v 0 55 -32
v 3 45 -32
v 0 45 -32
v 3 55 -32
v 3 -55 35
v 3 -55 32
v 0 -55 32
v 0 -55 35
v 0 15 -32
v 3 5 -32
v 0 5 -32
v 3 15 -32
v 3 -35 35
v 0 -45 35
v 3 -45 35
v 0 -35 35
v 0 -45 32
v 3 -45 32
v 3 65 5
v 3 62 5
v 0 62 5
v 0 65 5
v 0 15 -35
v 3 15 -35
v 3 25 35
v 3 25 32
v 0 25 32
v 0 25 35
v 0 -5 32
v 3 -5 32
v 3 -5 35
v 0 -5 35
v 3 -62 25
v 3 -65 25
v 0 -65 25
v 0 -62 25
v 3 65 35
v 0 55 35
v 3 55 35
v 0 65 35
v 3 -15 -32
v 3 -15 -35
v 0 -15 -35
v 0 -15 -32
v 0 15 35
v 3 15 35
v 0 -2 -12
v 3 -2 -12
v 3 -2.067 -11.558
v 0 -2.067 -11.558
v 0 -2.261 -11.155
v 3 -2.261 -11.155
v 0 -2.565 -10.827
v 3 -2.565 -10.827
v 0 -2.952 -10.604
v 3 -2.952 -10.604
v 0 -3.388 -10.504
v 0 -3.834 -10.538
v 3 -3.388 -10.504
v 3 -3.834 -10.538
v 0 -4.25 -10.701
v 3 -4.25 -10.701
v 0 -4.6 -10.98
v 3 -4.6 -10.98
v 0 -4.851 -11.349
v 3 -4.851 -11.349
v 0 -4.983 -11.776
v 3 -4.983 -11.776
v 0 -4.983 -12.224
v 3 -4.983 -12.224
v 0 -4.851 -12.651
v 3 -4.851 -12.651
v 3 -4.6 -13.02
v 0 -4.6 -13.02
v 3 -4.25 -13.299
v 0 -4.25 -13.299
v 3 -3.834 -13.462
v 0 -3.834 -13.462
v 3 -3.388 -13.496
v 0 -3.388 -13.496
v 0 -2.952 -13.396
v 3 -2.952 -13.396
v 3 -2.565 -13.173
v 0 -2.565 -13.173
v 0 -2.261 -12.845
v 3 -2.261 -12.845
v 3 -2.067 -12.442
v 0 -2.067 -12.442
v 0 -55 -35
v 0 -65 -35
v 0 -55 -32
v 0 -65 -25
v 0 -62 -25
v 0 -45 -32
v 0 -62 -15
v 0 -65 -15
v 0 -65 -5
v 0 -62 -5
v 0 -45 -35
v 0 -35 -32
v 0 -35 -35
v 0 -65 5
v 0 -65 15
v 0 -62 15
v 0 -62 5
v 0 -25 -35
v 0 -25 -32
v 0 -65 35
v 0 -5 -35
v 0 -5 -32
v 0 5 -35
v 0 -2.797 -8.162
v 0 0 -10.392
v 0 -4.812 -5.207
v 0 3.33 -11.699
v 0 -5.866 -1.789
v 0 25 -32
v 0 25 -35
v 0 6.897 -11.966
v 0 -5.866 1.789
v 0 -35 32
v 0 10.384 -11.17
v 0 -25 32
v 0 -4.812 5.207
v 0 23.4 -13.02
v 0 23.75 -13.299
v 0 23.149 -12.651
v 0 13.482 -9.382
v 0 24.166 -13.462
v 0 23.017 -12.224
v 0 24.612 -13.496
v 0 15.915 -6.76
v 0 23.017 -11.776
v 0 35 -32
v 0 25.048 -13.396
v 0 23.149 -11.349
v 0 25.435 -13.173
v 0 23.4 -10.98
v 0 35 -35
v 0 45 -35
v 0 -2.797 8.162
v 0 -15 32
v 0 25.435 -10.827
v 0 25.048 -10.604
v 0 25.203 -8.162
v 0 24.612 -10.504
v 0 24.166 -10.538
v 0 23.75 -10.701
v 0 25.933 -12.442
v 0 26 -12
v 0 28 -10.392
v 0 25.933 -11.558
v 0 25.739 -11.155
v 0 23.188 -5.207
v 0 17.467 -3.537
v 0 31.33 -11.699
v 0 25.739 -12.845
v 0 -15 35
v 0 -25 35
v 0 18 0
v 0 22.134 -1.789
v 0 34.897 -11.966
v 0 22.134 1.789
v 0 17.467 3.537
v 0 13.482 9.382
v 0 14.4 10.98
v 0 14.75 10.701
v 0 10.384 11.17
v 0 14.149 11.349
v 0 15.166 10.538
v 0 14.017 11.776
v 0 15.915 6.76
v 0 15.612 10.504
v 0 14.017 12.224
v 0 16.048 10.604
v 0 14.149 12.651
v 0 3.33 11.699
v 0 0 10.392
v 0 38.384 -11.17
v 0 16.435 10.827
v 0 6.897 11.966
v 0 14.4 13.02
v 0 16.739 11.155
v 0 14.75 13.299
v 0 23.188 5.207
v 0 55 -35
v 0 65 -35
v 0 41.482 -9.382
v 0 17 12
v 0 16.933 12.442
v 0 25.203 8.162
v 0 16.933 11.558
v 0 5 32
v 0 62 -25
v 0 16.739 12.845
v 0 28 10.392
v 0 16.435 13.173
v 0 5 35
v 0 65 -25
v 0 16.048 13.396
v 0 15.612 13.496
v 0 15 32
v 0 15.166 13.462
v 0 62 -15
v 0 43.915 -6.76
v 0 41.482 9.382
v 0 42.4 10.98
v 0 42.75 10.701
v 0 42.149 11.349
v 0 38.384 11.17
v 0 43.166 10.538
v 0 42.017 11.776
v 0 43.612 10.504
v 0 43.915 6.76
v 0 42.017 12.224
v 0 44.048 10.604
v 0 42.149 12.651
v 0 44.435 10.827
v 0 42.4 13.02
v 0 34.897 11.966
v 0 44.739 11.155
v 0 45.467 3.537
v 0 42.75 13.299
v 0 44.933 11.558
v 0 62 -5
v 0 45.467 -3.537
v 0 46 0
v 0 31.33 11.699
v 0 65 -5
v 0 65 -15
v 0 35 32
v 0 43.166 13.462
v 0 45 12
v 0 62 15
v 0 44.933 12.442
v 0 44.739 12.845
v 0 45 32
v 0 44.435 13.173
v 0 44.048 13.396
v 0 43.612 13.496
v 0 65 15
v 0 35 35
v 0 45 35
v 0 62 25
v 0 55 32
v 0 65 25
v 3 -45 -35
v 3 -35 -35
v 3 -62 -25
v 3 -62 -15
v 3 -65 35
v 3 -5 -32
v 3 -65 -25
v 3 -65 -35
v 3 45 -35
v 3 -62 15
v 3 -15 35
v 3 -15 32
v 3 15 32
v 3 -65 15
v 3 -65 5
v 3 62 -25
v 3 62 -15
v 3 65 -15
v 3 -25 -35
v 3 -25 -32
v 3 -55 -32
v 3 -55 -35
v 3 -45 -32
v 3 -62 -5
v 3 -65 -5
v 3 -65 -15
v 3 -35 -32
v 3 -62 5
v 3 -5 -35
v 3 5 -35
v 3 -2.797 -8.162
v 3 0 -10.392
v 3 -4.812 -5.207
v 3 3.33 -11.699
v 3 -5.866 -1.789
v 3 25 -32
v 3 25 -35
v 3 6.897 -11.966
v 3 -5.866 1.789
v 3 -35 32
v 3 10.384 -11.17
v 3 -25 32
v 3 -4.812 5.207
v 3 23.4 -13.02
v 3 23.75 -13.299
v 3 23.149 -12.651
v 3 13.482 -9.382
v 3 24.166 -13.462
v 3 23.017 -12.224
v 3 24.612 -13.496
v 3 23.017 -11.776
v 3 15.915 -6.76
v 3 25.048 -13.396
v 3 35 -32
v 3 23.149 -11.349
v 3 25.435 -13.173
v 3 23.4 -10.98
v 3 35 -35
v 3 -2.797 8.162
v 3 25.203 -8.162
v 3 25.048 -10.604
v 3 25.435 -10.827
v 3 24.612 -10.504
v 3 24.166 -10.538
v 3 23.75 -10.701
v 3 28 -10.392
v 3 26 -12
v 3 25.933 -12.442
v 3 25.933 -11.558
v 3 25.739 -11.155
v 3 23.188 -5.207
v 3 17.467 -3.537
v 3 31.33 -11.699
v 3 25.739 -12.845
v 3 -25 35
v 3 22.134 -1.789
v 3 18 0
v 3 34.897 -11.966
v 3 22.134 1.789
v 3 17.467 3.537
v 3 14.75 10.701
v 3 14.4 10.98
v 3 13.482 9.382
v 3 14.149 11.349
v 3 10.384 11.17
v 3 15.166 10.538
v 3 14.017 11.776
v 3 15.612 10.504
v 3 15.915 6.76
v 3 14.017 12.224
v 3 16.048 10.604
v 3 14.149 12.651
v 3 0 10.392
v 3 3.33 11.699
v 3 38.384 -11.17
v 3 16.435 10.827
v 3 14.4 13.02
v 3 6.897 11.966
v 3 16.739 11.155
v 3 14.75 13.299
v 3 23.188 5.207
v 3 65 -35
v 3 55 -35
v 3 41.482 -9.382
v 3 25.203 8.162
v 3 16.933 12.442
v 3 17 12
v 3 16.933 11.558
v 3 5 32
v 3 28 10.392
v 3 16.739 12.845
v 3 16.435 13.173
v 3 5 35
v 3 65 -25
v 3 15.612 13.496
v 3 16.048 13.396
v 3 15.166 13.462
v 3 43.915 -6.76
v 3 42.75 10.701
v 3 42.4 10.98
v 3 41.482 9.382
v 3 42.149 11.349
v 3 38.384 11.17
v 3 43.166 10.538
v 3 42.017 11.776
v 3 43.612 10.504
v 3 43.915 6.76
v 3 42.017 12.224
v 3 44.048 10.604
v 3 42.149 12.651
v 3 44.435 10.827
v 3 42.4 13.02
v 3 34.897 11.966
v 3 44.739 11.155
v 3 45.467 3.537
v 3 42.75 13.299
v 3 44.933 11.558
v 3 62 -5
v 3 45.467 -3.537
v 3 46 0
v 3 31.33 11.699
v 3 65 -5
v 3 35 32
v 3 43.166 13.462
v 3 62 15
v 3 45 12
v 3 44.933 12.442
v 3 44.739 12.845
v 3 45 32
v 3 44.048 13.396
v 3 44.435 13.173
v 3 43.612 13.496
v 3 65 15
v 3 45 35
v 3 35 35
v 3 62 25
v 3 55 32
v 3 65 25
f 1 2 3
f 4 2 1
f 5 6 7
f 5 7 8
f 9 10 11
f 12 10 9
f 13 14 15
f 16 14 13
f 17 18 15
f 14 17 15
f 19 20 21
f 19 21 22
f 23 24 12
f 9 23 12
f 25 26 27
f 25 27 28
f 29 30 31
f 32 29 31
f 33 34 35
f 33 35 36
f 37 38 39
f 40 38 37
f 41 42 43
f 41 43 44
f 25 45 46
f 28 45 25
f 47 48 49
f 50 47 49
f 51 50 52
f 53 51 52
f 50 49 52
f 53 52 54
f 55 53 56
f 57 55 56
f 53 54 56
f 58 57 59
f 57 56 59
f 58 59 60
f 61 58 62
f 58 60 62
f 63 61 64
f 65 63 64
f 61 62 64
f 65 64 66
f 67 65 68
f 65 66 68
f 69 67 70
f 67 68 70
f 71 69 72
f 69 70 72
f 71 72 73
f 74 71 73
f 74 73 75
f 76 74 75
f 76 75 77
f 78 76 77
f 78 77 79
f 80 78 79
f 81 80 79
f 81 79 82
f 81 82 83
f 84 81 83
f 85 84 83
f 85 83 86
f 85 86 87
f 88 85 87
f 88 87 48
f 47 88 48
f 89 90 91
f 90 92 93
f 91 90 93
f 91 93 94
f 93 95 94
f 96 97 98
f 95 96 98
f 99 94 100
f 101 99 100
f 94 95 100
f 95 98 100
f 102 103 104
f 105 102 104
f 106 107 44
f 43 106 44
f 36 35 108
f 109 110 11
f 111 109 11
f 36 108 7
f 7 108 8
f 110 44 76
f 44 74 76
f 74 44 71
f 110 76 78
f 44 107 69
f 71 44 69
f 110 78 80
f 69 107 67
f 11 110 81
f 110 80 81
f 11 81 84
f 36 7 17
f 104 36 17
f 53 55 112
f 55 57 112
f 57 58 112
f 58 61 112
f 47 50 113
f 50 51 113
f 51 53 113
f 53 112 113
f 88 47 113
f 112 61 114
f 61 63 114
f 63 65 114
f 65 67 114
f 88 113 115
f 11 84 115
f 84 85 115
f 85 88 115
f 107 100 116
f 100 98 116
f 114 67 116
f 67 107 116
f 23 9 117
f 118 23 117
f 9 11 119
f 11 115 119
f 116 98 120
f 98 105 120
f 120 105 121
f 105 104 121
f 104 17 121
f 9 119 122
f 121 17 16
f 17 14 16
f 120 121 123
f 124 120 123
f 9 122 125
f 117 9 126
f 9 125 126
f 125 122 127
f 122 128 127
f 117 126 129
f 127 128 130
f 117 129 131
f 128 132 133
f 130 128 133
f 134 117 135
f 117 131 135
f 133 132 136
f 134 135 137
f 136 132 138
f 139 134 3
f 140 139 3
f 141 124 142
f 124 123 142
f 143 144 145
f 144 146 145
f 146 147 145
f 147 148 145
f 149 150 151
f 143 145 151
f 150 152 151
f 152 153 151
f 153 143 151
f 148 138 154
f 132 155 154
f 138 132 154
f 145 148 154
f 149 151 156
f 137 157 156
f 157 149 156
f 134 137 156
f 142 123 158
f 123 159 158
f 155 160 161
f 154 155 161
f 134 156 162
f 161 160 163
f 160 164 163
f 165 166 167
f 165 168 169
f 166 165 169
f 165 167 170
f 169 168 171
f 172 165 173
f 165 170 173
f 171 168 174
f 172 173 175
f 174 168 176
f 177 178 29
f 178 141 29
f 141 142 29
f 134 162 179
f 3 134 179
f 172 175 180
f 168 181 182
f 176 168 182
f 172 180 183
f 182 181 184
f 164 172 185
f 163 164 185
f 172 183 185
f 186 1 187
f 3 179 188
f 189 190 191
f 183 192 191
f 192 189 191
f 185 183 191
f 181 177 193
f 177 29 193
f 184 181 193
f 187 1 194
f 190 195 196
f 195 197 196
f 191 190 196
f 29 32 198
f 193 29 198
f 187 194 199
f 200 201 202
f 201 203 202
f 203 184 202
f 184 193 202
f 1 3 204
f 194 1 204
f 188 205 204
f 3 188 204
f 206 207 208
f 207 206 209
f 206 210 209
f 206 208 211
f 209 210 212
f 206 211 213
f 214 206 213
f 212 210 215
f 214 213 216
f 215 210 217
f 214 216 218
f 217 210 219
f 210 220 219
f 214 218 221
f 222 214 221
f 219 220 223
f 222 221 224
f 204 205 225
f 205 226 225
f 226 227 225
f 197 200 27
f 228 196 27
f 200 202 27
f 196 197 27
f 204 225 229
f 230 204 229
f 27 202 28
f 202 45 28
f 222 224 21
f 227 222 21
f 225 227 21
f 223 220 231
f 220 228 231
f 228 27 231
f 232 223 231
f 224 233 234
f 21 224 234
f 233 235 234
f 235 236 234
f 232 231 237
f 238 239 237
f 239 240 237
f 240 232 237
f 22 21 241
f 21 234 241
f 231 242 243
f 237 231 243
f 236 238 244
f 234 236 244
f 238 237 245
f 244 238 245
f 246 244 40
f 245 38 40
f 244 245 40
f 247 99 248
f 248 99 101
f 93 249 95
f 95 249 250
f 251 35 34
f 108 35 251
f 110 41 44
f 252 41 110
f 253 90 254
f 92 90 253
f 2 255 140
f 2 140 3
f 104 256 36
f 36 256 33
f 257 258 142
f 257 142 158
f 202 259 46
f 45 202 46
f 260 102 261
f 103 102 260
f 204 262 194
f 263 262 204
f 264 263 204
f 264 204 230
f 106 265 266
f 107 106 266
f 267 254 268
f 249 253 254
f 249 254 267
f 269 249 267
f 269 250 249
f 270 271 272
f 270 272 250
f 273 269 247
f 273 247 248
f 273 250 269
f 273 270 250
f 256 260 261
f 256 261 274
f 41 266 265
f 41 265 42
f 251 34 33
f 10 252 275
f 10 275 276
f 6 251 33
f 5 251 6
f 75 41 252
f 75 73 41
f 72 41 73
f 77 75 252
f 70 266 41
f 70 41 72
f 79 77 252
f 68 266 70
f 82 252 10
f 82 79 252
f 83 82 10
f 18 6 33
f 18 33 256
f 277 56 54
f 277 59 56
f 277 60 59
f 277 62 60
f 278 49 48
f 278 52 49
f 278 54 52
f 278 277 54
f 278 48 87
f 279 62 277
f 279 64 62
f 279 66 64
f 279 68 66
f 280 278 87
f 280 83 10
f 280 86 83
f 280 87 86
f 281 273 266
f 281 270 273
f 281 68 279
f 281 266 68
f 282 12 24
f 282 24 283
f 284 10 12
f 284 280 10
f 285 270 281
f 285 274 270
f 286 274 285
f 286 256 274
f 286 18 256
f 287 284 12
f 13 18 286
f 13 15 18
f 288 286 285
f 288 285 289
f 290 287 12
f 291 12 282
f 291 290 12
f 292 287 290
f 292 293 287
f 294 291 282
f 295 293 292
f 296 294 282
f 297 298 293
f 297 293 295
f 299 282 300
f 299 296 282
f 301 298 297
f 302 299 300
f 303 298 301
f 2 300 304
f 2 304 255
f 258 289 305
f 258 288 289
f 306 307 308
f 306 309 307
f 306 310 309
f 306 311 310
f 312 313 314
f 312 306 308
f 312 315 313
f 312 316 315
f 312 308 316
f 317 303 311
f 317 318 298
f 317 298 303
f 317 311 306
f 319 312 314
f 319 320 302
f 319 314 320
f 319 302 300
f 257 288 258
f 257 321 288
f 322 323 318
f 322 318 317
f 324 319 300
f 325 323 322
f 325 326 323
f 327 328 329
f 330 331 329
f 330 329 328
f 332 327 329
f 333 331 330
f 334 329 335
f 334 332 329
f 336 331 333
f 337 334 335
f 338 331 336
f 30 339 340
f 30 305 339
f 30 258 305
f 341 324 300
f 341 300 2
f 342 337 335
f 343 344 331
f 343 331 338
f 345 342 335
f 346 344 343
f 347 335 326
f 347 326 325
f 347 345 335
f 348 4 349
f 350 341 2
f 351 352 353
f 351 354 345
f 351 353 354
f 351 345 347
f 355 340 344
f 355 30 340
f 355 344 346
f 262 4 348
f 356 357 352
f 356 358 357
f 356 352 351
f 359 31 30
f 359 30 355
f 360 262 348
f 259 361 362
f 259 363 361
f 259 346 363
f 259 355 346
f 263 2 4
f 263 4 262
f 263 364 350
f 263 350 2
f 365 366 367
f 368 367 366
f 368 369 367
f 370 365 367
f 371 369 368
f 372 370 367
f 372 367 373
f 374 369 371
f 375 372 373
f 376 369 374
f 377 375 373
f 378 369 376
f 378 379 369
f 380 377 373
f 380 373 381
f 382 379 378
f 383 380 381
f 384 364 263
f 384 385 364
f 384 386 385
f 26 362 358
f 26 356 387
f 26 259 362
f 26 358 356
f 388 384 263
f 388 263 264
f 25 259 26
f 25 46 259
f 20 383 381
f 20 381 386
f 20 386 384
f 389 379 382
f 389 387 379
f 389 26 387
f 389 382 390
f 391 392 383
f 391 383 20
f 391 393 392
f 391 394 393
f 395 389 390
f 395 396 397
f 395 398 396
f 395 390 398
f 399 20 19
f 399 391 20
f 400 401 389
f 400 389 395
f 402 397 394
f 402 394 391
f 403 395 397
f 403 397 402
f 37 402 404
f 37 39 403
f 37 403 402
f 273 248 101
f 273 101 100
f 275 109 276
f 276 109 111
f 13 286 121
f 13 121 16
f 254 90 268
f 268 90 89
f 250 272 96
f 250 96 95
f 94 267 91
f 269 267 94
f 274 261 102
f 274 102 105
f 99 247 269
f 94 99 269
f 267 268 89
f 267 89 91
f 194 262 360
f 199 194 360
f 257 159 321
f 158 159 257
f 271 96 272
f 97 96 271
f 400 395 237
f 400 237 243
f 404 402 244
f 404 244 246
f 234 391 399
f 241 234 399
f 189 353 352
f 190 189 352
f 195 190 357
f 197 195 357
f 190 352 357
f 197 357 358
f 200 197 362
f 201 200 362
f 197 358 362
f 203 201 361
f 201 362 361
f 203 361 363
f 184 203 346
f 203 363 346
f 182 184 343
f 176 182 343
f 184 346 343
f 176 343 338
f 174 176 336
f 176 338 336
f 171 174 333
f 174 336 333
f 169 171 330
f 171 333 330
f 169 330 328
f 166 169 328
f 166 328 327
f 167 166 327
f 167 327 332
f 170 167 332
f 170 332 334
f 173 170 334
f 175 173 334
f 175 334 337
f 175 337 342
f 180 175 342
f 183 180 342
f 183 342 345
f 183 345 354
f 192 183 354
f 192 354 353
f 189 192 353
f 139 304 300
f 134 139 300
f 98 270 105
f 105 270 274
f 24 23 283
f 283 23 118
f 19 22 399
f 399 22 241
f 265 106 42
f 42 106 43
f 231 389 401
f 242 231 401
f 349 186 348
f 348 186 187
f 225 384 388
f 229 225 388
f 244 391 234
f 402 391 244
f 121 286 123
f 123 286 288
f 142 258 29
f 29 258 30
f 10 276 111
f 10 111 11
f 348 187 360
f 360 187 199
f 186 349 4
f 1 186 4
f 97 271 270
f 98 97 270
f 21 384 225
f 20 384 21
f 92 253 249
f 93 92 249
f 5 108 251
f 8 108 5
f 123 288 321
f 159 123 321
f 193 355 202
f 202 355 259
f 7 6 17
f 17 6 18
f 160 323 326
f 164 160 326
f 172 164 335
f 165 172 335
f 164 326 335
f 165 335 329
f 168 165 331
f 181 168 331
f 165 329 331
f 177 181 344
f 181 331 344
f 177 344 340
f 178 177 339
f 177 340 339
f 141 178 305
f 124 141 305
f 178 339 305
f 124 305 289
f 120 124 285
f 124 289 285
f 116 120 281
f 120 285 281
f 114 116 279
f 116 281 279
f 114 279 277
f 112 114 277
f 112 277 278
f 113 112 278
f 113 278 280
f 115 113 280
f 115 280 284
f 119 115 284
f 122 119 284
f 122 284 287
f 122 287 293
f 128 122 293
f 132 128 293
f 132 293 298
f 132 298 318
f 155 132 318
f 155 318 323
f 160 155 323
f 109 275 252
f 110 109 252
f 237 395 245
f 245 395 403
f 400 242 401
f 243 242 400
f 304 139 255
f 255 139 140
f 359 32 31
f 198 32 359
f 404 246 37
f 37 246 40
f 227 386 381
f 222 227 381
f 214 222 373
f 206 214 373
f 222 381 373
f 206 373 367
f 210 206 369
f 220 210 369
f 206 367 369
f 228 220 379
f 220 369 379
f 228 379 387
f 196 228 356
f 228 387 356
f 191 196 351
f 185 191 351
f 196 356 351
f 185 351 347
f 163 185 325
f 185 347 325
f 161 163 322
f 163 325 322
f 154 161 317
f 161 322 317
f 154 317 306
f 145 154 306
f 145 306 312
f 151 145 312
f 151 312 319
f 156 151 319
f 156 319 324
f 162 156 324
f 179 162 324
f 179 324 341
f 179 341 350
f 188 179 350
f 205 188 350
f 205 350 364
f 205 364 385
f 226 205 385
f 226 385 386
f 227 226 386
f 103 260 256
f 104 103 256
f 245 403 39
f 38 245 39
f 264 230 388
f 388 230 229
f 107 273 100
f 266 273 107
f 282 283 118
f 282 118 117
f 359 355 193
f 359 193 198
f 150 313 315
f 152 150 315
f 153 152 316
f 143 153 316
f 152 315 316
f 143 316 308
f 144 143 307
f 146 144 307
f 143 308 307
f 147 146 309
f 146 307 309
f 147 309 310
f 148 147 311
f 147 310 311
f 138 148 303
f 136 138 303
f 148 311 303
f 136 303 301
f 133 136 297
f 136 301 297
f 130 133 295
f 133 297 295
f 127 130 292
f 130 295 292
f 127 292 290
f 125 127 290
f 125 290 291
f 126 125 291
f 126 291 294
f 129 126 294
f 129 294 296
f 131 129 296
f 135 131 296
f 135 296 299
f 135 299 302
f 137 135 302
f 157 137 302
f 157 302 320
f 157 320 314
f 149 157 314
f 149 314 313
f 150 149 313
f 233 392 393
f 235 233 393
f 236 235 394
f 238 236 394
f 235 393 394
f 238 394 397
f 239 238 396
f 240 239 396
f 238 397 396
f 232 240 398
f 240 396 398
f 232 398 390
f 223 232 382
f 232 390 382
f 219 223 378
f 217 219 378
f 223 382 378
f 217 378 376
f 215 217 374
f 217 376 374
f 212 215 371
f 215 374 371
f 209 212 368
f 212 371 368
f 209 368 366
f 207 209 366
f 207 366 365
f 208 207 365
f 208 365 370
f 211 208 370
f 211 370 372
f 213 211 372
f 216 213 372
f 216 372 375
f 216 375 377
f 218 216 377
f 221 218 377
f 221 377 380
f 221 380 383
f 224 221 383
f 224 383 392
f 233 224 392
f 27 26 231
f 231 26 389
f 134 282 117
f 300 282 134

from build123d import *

# Parameters (mm, degrees)
F0_W     = 130
F0_H     = 70
F1_DEPTH = 3
F2_W     = 3
F2_H     = 10
F2_W_2   = 10
F2_H_2   = 3
F3_DEPTH = 3.001
F4_R     = 12
F4_R_2   = 1.5
F5_DEPTH = 3.001


with BuildPart() as f1:
    # F0 (on Right) → F1 (new body)
    with BuildSketch(Plane.YZ):
        Rectangle(F0_W, F0_H)
    extrude(amount=F1_DEPTH)

    # F2 (on face) → F3 (cut, through all)
    with BuildSketch(Plane.YZ.offset(3)):
        with Locations((-63.5, 20)):
            Rectangle(F2_W, F2_H)
        with Locations((-63.5, 0)):
            Rectangle(F2_W, F2_H)
        with Locations((-63.5, -20)):
            Rectangle(F2_W, F2_H)
        with Locations((63.5, 0)):
            Rectangle(F2_W, F2_H)
        with Locations((63.5, 20)):
            Rectangle(F2_W, F2_H)
        with Locations((63.5, -20)):
            Rectangle(F2_W, F2_H)
        with Locations((-50, -33.5)):
            Rectangle(F2_W_2, F2_H_2)
        with Locations((-30, -33.5)):
            Rectangle(F2_W_2, F2_H_2)
        with Locations((-10, -33.5)):
            Rectangle(F2_W_2, F2_H_2)
        with Locations((10, -33.5)):
            Rectangle(F2_W_2, F2_H_2)
        with Locations((30, -33.5)):
            Rectangle(F2_W_2, F2_H_2)
        with Locations((50, -33.5)):
            Rectangle(F2_W_2, F2_H_2)
        with Locations((-50, 33.5)):
            Rectangle(F2_W_2, F2_H_2)
        with Locations((-30, 33.5)):
            Rectangle(F2_W_2, F2_H_2)
        with Locations((50, 33.5)):
            Rectangle(F2_W_2, F2_H_2)
        with Locations((-10, 33.5)):
            Rectangle(F2_W_2, F2_H_2)
        with Locations((10, 33.5)):
            Rectangle(F2_W_2, F2_H_2)
        with Locations((30, 33.5)):
            Rectangle(F2_W_2, F2_H_2)
    extrude(amount=-F3_DEPTH, mode=Mode.SUBTRACT)

    # F4 (on face) → F5 (cut, through all)
    with BuildSketch(Plane.YZ.offset(3)):
        with Locations((34, 0)):
            Circle(F4_R)
        with Locations((43.5, 12)):
            Circle(F4_R_2)
        with Locations((24.5, -12)):
            Circle(F4_R_2)
        with Locations((6, 0)):
            Circle(F4_R)
        with Locations((-3.5, -12)):
            Circle(F4_R_2)
        with Locations((15.5, 12)):
            Circle(F4_R_2)
    extrude(amount=-F5_DEPTH, mode=Mode.SUBTRACT)


solid = f1.part
